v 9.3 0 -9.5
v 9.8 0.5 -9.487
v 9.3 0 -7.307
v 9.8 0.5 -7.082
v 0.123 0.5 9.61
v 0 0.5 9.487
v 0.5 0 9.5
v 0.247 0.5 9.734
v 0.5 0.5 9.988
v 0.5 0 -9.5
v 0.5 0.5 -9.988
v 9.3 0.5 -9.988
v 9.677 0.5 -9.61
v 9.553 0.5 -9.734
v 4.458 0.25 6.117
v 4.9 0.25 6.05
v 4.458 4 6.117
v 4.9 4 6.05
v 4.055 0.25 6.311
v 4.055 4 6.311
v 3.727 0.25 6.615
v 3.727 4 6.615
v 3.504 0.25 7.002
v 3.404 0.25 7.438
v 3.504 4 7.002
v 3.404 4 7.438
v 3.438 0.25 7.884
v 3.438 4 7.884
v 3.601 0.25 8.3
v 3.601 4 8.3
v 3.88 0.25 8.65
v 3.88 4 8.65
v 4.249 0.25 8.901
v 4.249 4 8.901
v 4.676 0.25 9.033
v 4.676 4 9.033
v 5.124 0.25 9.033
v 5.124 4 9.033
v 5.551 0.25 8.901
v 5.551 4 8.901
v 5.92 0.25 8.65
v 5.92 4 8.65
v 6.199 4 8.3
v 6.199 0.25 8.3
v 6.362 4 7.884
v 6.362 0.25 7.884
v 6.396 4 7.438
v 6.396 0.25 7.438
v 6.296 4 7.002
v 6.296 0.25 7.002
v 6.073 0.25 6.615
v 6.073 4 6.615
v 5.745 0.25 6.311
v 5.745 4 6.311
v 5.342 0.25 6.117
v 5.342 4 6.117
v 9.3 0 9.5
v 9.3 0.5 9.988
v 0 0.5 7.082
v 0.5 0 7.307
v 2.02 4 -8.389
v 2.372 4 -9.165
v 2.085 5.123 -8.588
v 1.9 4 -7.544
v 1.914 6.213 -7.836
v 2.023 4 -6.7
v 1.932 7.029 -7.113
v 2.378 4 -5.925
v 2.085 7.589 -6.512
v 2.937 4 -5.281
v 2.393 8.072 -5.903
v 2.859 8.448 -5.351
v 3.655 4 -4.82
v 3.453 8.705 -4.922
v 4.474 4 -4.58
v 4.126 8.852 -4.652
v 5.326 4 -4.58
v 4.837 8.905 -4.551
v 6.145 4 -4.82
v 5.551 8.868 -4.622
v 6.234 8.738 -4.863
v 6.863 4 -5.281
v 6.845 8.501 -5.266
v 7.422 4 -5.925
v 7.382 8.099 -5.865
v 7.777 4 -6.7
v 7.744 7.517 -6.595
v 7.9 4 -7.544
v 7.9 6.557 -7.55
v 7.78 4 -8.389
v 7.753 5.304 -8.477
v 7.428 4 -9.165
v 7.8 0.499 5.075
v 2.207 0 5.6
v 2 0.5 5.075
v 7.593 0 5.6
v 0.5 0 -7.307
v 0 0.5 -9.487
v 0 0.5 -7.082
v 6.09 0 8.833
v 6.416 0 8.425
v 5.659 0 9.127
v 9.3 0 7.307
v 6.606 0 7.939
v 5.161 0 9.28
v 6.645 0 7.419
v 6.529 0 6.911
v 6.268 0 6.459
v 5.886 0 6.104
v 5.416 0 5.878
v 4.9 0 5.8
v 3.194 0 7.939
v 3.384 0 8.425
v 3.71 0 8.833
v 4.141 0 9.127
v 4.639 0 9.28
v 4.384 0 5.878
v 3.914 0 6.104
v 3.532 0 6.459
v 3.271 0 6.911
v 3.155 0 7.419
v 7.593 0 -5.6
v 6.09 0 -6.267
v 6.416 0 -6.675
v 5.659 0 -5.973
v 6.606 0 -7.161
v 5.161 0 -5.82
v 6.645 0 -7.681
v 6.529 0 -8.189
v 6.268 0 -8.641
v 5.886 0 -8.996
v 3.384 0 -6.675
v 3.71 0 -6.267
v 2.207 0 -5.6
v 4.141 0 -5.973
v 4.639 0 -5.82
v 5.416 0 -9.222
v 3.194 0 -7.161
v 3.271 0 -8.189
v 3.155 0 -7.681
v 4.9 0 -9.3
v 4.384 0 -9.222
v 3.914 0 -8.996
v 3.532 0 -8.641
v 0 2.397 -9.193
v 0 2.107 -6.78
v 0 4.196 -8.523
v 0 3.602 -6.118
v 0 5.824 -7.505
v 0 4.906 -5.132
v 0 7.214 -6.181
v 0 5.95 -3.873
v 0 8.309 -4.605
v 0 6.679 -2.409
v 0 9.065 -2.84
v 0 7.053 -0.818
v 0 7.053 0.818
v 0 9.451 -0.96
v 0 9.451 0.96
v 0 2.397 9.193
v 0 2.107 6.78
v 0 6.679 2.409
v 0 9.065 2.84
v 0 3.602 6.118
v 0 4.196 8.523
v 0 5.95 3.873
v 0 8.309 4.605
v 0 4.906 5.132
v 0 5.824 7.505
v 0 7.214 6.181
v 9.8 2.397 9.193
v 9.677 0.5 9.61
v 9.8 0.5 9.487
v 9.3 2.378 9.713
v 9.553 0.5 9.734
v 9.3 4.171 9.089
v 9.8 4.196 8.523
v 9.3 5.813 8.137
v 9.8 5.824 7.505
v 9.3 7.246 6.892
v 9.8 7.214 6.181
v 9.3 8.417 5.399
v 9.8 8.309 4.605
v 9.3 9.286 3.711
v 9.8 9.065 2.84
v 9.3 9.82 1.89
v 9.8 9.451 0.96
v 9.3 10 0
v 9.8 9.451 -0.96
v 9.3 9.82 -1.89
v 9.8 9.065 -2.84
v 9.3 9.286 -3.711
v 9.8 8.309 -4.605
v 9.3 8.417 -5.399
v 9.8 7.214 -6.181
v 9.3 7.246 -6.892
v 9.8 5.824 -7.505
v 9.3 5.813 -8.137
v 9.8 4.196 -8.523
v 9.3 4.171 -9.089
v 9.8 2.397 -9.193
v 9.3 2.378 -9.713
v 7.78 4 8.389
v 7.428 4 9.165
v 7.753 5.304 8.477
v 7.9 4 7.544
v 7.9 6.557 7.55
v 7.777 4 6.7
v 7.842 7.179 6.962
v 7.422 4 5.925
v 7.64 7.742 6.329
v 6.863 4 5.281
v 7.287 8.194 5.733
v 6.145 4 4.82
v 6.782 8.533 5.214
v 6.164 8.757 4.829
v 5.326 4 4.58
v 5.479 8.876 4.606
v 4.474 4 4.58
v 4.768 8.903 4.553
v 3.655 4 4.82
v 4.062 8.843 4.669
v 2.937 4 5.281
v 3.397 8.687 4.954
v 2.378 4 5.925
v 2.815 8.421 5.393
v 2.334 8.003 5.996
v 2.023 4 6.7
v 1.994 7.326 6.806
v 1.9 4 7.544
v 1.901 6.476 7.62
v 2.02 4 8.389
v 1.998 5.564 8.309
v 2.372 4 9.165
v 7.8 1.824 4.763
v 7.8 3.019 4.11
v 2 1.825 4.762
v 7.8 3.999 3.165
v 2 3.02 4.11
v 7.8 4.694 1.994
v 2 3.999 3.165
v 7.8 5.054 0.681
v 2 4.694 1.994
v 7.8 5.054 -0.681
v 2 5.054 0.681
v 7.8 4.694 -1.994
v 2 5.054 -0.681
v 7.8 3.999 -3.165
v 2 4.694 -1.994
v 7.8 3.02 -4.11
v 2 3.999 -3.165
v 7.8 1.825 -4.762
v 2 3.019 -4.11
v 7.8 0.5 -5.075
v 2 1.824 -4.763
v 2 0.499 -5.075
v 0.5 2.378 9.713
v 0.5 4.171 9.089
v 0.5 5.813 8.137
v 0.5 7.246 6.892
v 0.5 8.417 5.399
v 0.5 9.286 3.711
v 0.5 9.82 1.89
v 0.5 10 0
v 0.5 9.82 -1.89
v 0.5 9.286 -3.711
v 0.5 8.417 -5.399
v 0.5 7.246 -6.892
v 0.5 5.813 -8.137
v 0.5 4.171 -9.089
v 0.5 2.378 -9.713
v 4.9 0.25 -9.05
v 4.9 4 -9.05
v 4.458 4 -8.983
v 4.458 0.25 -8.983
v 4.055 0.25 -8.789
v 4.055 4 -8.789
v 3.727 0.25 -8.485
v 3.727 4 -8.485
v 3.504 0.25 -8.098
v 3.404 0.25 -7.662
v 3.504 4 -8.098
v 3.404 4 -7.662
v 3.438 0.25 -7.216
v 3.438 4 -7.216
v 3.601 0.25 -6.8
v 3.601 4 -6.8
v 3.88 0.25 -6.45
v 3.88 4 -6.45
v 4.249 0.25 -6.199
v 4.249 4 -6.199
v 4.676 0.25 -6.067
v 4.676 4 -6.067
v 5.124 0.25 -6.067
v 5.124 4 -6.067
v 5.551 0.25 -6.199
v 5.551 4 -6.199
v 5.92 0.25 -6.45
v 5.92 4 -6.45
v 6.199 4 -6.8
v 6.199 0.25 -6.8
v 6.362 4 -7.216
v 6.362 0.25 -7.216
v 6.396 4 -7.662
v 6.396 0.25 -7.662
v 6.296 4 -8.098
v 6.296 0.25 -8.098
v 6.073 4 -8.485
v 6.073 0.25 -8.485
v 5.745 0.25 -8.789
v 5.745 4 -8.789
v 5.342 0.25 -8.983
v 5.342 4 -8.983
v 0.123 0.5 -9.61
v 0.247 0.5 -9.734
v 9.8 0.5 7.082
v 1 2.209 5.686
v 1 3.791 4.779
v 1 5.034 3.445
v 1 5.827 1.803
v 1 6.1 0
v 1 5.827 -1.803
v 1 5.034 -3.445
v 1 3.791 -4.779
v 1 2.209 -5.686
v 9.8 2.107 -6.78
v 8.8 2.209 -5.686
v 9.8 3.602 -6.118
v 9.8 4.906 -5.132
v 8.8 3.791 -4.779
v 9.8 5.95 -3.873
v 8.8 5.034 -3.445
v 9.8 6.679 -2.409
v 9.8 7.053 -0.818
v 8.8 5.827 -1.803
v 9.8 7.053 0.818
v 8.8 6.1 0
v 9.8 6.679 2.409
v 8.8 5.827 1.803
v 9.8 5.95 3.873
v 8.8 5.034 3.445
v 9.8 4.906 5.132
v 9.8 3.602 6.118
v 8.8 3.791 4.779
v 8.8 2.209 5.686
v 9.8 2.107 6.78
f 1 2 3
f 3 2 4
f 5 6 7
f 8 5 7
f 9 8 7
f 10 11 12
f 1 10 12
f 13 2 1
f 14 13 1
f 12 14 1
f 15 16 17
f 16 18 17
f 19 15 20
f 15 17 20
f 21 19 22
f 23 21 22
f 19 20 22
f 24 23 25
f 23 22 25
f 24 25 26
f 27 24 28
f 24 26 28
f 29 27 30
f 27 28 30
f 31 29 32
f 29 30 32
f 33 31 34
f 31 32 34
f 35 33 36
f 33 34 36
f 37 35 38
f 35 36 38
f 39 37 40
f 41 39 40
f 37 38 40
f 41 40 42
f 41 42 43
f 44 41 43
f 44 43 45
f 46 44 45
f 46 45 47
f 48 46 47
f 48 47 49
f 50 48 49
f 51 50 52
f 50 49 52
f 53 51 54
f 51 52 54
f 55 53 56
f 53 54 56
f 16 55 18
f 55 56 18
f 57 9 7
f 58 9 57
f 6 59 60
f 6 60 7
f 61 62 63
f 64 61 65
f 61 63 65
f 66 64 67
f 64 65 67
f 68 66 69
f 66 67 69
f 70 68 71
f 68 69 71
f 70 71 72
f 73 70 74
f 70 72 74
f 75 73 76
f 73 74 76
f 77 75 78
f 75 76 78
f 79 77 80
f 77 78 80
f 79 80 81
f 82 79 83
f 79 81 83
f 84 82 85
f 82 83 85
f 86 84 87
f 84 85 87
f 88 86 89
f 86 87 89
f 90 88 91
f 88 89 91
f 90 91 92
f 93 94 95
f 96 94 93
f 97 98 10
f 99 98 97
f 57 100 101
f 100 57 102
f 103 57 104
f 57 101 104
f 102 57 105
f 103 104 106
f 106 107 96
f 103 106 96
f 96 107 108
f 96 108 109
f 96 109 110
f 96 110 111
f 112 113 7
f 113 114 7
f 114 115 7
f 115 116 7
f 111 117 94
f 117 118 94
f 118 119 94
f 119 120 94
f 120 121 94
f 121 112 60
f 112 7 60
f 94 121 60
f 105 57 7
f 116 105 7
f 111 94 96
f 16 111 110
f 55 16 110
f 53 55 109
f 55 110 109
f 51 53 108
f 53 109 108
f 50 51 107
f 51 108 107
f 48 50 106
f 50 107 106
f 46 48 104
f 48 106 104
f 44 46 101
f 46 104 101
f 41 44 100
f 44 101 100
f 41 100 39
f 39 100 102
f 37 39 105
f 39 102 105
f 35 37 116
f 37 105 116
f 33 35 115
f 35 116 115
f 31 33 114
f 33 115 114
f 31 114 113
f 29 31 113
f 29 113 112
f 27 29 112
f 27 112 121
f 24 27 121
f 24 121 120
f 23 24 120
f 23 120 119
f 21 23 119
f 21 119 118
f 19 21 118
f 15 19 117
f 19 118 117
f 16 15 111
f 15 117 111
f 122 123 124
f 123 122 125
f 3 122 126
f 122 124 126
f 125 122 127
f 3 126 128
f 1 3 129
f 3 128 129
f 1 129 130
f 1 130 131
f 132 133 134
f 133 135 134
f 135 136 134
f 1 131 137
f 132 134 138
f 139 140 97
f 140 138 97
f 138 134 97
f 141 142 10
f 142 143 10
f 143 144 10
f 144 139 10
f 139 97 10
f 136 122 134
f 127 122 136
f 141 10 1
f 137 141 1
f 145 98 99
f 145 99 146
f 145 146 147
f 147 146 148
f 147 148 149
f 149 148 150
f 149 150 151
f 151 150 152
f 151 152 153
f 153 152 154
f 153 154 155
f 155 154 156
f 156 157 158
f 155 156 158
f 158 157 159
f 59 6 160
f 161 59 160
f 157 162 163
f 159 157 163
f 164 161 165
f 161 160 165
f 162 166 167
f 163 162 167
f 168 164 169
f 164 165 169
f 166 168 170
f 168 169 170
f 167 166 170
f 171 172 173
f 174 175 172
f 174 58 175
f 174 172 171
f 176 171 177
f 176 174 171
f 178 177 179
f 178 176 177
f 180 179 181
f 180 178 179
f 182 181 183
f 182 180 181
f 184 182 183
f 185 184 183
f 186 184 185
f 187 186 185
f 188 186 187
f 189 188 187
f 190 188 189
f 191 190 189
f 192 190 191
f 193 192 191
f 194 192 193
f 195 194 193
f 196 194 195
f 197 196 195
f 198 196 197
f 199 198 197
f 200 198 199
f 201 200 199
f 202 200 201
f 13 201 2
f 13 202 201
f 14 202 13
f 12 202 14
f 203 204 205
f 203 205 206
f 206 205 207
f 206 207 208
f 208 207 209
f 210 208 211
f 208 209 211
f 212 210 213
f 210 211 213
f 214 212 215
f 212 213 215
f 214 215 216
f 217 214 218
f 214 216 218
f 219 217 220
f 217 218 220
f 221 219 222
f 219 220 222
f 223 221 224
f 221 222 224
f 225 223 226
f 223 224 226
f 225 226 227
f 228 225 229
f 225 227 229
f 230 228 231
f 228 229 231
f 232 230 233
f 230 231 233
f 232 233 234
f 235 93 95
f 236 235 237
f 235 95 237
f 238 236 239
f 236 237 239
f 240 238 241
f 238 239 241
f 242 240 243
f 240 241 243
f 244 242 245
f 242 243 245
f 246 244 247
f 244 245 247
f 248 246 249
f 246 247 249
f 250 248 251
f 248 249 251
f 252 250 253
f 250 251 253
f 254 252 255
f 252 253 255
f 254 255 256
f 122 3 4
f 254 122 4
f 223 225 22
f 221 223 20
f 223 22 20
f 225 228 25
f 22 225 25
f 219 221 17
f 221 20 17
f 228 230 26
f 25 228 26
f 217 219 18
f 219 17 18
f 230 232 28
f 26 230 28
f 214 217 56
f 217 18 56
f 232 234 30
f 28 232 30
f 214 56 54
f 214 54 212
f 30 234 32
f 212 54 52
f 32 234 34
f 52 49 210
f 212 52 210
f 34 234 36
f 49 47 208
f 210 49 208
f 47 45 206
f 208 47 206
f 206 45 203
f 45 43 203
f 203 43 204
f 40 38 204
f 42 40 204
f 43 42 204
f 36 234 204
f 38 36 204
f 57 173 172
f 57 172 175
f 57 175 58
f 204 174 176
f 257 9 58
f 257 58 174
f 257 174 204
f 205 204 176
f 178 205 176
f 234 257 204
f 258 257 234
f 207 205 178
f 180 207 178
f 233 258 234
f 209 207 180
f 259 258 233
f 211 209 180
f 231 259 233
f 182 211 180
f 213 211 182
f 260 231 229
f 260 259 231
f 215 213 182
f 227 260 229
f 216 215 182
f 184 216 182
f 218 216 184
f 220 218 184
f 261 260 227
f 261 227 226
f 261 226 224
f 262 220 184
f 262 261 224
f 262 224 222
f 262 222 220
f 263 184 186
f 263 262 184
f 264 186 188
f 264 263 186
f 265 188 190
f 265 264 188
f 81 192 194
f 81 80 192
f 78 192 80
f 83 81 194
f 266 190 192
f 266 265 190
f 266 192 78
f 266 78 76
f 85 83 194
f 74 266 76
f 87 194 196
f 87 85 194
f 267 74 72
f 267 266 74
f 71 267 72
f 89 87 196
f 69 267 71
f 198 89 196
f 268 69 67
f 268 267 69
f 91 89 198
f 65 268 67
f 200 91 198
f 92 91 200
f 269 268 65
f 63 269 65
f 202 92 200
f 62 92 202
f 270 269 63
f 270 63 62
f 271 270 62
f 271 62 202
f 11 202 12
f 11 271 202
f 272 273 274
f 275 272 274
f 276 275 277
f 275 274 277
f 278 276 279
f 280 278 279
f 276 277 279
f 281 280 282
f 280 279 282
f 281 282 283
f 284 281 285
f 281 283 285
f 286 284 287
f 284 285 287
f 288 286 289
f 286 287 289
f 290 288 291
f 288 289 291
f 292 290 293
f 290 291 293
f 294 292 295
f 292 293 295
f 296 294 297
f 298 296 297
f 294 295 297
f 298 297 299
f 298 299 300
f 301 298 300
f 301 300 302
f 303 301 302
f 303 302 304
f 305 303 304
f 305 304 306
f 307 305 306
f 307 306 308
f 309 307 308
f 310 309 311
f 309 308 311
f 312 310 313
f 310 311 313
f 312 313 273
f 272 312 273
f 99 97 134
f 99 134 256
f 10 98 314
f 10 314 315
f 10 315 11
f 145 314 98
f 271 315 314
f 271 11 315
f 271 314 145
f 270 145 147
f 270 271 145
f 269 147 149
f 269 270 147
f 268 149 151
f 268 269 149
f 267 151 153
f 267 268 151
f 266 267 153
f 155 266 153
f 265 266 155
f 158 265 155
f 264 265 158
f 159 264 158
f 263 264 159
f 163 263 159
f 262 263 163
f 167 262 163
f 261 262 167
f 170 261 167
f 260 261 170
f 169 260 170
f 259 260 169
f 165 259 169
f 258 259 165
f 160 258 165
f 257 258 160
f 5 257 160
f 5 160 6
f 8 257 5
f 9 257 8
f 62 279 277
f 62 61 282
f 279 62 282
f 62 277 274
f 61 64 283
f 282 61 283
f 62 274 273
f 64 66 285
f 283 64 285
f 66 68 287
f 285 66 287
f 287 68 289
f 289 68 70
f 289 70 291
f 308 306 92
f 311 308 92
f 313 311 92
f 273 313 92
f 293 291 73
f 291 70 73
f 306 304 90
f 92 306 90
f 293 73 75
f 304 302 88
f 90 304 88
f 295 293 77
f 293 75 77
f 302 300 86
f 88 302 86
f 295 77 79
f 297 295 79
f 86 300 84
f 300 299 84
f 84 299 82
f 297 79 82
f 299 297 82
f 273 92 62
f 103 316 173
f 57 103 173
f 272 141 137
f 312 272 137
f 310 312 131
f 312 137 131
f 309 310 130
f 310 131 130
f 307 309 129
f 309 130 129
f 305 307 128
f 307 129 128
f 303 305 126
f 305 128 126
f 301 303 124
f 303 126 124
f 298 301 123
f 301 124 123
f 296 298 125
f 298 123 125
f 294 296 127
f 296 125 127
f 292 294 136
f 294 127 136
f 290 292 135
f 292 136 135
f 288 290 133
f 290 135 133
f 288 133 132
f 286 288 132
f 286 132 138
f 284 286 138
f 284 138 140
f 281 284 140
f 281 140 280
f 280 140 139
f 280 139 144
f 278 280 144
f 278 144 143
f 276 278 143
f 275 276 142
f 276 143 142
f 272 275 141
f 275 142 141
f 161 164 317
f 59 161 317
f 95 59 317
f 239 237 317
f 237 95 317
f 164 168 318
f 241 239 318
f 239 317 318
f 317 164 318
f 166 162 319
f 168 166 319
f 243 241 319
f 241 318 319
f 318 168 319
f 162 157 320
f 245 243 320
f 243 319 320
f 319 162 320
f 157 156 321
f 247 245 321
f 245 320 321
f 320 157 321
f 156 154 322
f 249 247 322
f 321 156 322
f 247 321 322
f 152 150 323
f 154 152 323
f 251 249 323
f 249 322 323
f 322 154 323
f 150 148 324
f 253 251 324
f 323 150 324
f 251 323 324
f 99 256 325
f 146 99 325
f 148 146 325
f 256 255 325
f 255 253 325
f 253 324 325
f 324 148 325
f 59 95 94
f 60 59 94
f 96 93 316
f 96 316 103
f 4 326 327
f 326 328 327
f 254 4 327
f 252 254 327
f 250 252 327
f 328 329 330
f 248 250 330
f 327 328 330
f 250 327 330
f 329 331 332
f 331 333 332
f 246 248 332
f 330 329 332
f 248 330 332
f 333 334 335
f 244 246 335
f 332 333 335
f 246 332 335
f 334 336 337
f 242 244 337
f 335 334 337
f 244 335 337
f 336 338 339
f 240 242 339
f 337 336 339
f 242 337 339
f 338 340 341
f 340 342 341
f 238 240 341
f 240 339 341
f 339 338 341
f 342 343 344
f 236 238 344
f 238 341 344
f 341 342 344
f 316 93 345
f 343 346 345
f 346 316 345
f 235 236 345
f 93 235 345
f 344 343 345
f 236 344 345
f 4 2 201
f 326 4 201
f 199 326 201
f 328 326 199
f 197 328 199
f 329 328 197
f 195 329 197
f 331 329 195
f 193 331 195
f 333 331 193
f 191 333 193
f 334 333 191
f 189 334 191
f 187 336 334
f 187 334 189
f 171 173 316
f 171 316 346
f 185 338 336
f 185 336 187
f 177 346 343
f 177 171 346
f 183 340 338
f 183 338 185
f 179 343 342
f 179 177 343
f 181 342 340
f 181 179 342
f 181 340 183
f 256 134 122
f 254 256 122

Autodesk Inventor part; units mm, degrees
ref_plane "YZ Plane" through (0, 0, 0) normal (1, 0, 0) x (0, 1, 0)
ref_plane "XZ Plane" through (0, 0, 0) normal (0, 1, 0) x (-1, 0, 0)
sketch "Sketch1" plane through (0, 0, 0) normal (1, 0, 0) x (0, 1, 0)
  arc A0 (0, -5.1) -> (0, 5.1) centre (0, 0) ccw
  arc A1 (0, -10) -> (0, 10) centre (0, 0) ccw
  line L0 (0, 10) -> (0, 5.1)
  line L1 (0, -5.1) -> (0, -10)
  dimension "d0" = 10.2
  dimension "d1" = 20
extrude "Extrusion1" add sketch "Sketch1" along normal blind 9.8
sketch "Sketch2" plane through (0, 0, 5.1) normal (0, -1, 0) x (1, 0, 0)
  line L0 (0, 4.9) -> (0, 0) projected
  line L1 (0, 0) -> (9.8, 0) projected
  line L2 (0, 4.9) -> (9.8, 0)
  line L3 (0, -10.2) -> (9.8, -10.2) projected
  line L4 (0, -15.1) -> (9.8, -15.1) projected
  line L5 (0, -10.2) -> (9.8, -15.1)
  point P0 (0, -5.1)
  point P1 (4.9, 2.45)
  point P2 (4.9, -12.65)
hole "Hole1" at (4.9, 0, 7.55) at (4.9, 0, -7.55) direction (0, 1, 0) diameter 3 end through all countersink diameter 3.5 countersink angle 90
ref_plane "Work Plane1" through (0, 10, 5.1) normal (0, -1, 0) x (1, 0, 0)
sketch "Sketch3" plane through (0, 10, 5.1) normal (0, -1, 0) x (1, 0, 0)
  circle A0 centre (4.9, -12.65) radius 1.5 projected
  circle A1 centre (4.9, -12.65) radius 3
  circle A2 centre (4.9, 2.45) radius 1.5 projected
  circle A3 centre (4.9, 2.45) radius 3
  point P0 (0, -5.1)
  dimension "d12" = 6
  dimension "d13" = 6
extrude "Extrusion2" cut sketch "Sketch3" along normal blind 6 contours A0 | A1 | A2 | A3
chamfer "Chamfer1" distance 2 angle 45 2 edges at (9.8, 5.1, 0) (0, 5.1, 0)
chamfer "Chamfer2" distance 0.5 angle 45 14 edges at (9.8, 10, 0) (9.8, 0, 8.55) (4.9, 0, 10) (0, 10, 0) (9.8, 0, -8.55) (8.8, 0, -6.1) (4.9, 0, -5.1) (0, 0, 8.55) (1, 0, 6.1) (4.9, 0, 5.1) (8.8, 0, 6.1) (1, 0, -6.1) (0, 0, -8.55) (4.9, 0, -10)
properties part number "ForkTop"
